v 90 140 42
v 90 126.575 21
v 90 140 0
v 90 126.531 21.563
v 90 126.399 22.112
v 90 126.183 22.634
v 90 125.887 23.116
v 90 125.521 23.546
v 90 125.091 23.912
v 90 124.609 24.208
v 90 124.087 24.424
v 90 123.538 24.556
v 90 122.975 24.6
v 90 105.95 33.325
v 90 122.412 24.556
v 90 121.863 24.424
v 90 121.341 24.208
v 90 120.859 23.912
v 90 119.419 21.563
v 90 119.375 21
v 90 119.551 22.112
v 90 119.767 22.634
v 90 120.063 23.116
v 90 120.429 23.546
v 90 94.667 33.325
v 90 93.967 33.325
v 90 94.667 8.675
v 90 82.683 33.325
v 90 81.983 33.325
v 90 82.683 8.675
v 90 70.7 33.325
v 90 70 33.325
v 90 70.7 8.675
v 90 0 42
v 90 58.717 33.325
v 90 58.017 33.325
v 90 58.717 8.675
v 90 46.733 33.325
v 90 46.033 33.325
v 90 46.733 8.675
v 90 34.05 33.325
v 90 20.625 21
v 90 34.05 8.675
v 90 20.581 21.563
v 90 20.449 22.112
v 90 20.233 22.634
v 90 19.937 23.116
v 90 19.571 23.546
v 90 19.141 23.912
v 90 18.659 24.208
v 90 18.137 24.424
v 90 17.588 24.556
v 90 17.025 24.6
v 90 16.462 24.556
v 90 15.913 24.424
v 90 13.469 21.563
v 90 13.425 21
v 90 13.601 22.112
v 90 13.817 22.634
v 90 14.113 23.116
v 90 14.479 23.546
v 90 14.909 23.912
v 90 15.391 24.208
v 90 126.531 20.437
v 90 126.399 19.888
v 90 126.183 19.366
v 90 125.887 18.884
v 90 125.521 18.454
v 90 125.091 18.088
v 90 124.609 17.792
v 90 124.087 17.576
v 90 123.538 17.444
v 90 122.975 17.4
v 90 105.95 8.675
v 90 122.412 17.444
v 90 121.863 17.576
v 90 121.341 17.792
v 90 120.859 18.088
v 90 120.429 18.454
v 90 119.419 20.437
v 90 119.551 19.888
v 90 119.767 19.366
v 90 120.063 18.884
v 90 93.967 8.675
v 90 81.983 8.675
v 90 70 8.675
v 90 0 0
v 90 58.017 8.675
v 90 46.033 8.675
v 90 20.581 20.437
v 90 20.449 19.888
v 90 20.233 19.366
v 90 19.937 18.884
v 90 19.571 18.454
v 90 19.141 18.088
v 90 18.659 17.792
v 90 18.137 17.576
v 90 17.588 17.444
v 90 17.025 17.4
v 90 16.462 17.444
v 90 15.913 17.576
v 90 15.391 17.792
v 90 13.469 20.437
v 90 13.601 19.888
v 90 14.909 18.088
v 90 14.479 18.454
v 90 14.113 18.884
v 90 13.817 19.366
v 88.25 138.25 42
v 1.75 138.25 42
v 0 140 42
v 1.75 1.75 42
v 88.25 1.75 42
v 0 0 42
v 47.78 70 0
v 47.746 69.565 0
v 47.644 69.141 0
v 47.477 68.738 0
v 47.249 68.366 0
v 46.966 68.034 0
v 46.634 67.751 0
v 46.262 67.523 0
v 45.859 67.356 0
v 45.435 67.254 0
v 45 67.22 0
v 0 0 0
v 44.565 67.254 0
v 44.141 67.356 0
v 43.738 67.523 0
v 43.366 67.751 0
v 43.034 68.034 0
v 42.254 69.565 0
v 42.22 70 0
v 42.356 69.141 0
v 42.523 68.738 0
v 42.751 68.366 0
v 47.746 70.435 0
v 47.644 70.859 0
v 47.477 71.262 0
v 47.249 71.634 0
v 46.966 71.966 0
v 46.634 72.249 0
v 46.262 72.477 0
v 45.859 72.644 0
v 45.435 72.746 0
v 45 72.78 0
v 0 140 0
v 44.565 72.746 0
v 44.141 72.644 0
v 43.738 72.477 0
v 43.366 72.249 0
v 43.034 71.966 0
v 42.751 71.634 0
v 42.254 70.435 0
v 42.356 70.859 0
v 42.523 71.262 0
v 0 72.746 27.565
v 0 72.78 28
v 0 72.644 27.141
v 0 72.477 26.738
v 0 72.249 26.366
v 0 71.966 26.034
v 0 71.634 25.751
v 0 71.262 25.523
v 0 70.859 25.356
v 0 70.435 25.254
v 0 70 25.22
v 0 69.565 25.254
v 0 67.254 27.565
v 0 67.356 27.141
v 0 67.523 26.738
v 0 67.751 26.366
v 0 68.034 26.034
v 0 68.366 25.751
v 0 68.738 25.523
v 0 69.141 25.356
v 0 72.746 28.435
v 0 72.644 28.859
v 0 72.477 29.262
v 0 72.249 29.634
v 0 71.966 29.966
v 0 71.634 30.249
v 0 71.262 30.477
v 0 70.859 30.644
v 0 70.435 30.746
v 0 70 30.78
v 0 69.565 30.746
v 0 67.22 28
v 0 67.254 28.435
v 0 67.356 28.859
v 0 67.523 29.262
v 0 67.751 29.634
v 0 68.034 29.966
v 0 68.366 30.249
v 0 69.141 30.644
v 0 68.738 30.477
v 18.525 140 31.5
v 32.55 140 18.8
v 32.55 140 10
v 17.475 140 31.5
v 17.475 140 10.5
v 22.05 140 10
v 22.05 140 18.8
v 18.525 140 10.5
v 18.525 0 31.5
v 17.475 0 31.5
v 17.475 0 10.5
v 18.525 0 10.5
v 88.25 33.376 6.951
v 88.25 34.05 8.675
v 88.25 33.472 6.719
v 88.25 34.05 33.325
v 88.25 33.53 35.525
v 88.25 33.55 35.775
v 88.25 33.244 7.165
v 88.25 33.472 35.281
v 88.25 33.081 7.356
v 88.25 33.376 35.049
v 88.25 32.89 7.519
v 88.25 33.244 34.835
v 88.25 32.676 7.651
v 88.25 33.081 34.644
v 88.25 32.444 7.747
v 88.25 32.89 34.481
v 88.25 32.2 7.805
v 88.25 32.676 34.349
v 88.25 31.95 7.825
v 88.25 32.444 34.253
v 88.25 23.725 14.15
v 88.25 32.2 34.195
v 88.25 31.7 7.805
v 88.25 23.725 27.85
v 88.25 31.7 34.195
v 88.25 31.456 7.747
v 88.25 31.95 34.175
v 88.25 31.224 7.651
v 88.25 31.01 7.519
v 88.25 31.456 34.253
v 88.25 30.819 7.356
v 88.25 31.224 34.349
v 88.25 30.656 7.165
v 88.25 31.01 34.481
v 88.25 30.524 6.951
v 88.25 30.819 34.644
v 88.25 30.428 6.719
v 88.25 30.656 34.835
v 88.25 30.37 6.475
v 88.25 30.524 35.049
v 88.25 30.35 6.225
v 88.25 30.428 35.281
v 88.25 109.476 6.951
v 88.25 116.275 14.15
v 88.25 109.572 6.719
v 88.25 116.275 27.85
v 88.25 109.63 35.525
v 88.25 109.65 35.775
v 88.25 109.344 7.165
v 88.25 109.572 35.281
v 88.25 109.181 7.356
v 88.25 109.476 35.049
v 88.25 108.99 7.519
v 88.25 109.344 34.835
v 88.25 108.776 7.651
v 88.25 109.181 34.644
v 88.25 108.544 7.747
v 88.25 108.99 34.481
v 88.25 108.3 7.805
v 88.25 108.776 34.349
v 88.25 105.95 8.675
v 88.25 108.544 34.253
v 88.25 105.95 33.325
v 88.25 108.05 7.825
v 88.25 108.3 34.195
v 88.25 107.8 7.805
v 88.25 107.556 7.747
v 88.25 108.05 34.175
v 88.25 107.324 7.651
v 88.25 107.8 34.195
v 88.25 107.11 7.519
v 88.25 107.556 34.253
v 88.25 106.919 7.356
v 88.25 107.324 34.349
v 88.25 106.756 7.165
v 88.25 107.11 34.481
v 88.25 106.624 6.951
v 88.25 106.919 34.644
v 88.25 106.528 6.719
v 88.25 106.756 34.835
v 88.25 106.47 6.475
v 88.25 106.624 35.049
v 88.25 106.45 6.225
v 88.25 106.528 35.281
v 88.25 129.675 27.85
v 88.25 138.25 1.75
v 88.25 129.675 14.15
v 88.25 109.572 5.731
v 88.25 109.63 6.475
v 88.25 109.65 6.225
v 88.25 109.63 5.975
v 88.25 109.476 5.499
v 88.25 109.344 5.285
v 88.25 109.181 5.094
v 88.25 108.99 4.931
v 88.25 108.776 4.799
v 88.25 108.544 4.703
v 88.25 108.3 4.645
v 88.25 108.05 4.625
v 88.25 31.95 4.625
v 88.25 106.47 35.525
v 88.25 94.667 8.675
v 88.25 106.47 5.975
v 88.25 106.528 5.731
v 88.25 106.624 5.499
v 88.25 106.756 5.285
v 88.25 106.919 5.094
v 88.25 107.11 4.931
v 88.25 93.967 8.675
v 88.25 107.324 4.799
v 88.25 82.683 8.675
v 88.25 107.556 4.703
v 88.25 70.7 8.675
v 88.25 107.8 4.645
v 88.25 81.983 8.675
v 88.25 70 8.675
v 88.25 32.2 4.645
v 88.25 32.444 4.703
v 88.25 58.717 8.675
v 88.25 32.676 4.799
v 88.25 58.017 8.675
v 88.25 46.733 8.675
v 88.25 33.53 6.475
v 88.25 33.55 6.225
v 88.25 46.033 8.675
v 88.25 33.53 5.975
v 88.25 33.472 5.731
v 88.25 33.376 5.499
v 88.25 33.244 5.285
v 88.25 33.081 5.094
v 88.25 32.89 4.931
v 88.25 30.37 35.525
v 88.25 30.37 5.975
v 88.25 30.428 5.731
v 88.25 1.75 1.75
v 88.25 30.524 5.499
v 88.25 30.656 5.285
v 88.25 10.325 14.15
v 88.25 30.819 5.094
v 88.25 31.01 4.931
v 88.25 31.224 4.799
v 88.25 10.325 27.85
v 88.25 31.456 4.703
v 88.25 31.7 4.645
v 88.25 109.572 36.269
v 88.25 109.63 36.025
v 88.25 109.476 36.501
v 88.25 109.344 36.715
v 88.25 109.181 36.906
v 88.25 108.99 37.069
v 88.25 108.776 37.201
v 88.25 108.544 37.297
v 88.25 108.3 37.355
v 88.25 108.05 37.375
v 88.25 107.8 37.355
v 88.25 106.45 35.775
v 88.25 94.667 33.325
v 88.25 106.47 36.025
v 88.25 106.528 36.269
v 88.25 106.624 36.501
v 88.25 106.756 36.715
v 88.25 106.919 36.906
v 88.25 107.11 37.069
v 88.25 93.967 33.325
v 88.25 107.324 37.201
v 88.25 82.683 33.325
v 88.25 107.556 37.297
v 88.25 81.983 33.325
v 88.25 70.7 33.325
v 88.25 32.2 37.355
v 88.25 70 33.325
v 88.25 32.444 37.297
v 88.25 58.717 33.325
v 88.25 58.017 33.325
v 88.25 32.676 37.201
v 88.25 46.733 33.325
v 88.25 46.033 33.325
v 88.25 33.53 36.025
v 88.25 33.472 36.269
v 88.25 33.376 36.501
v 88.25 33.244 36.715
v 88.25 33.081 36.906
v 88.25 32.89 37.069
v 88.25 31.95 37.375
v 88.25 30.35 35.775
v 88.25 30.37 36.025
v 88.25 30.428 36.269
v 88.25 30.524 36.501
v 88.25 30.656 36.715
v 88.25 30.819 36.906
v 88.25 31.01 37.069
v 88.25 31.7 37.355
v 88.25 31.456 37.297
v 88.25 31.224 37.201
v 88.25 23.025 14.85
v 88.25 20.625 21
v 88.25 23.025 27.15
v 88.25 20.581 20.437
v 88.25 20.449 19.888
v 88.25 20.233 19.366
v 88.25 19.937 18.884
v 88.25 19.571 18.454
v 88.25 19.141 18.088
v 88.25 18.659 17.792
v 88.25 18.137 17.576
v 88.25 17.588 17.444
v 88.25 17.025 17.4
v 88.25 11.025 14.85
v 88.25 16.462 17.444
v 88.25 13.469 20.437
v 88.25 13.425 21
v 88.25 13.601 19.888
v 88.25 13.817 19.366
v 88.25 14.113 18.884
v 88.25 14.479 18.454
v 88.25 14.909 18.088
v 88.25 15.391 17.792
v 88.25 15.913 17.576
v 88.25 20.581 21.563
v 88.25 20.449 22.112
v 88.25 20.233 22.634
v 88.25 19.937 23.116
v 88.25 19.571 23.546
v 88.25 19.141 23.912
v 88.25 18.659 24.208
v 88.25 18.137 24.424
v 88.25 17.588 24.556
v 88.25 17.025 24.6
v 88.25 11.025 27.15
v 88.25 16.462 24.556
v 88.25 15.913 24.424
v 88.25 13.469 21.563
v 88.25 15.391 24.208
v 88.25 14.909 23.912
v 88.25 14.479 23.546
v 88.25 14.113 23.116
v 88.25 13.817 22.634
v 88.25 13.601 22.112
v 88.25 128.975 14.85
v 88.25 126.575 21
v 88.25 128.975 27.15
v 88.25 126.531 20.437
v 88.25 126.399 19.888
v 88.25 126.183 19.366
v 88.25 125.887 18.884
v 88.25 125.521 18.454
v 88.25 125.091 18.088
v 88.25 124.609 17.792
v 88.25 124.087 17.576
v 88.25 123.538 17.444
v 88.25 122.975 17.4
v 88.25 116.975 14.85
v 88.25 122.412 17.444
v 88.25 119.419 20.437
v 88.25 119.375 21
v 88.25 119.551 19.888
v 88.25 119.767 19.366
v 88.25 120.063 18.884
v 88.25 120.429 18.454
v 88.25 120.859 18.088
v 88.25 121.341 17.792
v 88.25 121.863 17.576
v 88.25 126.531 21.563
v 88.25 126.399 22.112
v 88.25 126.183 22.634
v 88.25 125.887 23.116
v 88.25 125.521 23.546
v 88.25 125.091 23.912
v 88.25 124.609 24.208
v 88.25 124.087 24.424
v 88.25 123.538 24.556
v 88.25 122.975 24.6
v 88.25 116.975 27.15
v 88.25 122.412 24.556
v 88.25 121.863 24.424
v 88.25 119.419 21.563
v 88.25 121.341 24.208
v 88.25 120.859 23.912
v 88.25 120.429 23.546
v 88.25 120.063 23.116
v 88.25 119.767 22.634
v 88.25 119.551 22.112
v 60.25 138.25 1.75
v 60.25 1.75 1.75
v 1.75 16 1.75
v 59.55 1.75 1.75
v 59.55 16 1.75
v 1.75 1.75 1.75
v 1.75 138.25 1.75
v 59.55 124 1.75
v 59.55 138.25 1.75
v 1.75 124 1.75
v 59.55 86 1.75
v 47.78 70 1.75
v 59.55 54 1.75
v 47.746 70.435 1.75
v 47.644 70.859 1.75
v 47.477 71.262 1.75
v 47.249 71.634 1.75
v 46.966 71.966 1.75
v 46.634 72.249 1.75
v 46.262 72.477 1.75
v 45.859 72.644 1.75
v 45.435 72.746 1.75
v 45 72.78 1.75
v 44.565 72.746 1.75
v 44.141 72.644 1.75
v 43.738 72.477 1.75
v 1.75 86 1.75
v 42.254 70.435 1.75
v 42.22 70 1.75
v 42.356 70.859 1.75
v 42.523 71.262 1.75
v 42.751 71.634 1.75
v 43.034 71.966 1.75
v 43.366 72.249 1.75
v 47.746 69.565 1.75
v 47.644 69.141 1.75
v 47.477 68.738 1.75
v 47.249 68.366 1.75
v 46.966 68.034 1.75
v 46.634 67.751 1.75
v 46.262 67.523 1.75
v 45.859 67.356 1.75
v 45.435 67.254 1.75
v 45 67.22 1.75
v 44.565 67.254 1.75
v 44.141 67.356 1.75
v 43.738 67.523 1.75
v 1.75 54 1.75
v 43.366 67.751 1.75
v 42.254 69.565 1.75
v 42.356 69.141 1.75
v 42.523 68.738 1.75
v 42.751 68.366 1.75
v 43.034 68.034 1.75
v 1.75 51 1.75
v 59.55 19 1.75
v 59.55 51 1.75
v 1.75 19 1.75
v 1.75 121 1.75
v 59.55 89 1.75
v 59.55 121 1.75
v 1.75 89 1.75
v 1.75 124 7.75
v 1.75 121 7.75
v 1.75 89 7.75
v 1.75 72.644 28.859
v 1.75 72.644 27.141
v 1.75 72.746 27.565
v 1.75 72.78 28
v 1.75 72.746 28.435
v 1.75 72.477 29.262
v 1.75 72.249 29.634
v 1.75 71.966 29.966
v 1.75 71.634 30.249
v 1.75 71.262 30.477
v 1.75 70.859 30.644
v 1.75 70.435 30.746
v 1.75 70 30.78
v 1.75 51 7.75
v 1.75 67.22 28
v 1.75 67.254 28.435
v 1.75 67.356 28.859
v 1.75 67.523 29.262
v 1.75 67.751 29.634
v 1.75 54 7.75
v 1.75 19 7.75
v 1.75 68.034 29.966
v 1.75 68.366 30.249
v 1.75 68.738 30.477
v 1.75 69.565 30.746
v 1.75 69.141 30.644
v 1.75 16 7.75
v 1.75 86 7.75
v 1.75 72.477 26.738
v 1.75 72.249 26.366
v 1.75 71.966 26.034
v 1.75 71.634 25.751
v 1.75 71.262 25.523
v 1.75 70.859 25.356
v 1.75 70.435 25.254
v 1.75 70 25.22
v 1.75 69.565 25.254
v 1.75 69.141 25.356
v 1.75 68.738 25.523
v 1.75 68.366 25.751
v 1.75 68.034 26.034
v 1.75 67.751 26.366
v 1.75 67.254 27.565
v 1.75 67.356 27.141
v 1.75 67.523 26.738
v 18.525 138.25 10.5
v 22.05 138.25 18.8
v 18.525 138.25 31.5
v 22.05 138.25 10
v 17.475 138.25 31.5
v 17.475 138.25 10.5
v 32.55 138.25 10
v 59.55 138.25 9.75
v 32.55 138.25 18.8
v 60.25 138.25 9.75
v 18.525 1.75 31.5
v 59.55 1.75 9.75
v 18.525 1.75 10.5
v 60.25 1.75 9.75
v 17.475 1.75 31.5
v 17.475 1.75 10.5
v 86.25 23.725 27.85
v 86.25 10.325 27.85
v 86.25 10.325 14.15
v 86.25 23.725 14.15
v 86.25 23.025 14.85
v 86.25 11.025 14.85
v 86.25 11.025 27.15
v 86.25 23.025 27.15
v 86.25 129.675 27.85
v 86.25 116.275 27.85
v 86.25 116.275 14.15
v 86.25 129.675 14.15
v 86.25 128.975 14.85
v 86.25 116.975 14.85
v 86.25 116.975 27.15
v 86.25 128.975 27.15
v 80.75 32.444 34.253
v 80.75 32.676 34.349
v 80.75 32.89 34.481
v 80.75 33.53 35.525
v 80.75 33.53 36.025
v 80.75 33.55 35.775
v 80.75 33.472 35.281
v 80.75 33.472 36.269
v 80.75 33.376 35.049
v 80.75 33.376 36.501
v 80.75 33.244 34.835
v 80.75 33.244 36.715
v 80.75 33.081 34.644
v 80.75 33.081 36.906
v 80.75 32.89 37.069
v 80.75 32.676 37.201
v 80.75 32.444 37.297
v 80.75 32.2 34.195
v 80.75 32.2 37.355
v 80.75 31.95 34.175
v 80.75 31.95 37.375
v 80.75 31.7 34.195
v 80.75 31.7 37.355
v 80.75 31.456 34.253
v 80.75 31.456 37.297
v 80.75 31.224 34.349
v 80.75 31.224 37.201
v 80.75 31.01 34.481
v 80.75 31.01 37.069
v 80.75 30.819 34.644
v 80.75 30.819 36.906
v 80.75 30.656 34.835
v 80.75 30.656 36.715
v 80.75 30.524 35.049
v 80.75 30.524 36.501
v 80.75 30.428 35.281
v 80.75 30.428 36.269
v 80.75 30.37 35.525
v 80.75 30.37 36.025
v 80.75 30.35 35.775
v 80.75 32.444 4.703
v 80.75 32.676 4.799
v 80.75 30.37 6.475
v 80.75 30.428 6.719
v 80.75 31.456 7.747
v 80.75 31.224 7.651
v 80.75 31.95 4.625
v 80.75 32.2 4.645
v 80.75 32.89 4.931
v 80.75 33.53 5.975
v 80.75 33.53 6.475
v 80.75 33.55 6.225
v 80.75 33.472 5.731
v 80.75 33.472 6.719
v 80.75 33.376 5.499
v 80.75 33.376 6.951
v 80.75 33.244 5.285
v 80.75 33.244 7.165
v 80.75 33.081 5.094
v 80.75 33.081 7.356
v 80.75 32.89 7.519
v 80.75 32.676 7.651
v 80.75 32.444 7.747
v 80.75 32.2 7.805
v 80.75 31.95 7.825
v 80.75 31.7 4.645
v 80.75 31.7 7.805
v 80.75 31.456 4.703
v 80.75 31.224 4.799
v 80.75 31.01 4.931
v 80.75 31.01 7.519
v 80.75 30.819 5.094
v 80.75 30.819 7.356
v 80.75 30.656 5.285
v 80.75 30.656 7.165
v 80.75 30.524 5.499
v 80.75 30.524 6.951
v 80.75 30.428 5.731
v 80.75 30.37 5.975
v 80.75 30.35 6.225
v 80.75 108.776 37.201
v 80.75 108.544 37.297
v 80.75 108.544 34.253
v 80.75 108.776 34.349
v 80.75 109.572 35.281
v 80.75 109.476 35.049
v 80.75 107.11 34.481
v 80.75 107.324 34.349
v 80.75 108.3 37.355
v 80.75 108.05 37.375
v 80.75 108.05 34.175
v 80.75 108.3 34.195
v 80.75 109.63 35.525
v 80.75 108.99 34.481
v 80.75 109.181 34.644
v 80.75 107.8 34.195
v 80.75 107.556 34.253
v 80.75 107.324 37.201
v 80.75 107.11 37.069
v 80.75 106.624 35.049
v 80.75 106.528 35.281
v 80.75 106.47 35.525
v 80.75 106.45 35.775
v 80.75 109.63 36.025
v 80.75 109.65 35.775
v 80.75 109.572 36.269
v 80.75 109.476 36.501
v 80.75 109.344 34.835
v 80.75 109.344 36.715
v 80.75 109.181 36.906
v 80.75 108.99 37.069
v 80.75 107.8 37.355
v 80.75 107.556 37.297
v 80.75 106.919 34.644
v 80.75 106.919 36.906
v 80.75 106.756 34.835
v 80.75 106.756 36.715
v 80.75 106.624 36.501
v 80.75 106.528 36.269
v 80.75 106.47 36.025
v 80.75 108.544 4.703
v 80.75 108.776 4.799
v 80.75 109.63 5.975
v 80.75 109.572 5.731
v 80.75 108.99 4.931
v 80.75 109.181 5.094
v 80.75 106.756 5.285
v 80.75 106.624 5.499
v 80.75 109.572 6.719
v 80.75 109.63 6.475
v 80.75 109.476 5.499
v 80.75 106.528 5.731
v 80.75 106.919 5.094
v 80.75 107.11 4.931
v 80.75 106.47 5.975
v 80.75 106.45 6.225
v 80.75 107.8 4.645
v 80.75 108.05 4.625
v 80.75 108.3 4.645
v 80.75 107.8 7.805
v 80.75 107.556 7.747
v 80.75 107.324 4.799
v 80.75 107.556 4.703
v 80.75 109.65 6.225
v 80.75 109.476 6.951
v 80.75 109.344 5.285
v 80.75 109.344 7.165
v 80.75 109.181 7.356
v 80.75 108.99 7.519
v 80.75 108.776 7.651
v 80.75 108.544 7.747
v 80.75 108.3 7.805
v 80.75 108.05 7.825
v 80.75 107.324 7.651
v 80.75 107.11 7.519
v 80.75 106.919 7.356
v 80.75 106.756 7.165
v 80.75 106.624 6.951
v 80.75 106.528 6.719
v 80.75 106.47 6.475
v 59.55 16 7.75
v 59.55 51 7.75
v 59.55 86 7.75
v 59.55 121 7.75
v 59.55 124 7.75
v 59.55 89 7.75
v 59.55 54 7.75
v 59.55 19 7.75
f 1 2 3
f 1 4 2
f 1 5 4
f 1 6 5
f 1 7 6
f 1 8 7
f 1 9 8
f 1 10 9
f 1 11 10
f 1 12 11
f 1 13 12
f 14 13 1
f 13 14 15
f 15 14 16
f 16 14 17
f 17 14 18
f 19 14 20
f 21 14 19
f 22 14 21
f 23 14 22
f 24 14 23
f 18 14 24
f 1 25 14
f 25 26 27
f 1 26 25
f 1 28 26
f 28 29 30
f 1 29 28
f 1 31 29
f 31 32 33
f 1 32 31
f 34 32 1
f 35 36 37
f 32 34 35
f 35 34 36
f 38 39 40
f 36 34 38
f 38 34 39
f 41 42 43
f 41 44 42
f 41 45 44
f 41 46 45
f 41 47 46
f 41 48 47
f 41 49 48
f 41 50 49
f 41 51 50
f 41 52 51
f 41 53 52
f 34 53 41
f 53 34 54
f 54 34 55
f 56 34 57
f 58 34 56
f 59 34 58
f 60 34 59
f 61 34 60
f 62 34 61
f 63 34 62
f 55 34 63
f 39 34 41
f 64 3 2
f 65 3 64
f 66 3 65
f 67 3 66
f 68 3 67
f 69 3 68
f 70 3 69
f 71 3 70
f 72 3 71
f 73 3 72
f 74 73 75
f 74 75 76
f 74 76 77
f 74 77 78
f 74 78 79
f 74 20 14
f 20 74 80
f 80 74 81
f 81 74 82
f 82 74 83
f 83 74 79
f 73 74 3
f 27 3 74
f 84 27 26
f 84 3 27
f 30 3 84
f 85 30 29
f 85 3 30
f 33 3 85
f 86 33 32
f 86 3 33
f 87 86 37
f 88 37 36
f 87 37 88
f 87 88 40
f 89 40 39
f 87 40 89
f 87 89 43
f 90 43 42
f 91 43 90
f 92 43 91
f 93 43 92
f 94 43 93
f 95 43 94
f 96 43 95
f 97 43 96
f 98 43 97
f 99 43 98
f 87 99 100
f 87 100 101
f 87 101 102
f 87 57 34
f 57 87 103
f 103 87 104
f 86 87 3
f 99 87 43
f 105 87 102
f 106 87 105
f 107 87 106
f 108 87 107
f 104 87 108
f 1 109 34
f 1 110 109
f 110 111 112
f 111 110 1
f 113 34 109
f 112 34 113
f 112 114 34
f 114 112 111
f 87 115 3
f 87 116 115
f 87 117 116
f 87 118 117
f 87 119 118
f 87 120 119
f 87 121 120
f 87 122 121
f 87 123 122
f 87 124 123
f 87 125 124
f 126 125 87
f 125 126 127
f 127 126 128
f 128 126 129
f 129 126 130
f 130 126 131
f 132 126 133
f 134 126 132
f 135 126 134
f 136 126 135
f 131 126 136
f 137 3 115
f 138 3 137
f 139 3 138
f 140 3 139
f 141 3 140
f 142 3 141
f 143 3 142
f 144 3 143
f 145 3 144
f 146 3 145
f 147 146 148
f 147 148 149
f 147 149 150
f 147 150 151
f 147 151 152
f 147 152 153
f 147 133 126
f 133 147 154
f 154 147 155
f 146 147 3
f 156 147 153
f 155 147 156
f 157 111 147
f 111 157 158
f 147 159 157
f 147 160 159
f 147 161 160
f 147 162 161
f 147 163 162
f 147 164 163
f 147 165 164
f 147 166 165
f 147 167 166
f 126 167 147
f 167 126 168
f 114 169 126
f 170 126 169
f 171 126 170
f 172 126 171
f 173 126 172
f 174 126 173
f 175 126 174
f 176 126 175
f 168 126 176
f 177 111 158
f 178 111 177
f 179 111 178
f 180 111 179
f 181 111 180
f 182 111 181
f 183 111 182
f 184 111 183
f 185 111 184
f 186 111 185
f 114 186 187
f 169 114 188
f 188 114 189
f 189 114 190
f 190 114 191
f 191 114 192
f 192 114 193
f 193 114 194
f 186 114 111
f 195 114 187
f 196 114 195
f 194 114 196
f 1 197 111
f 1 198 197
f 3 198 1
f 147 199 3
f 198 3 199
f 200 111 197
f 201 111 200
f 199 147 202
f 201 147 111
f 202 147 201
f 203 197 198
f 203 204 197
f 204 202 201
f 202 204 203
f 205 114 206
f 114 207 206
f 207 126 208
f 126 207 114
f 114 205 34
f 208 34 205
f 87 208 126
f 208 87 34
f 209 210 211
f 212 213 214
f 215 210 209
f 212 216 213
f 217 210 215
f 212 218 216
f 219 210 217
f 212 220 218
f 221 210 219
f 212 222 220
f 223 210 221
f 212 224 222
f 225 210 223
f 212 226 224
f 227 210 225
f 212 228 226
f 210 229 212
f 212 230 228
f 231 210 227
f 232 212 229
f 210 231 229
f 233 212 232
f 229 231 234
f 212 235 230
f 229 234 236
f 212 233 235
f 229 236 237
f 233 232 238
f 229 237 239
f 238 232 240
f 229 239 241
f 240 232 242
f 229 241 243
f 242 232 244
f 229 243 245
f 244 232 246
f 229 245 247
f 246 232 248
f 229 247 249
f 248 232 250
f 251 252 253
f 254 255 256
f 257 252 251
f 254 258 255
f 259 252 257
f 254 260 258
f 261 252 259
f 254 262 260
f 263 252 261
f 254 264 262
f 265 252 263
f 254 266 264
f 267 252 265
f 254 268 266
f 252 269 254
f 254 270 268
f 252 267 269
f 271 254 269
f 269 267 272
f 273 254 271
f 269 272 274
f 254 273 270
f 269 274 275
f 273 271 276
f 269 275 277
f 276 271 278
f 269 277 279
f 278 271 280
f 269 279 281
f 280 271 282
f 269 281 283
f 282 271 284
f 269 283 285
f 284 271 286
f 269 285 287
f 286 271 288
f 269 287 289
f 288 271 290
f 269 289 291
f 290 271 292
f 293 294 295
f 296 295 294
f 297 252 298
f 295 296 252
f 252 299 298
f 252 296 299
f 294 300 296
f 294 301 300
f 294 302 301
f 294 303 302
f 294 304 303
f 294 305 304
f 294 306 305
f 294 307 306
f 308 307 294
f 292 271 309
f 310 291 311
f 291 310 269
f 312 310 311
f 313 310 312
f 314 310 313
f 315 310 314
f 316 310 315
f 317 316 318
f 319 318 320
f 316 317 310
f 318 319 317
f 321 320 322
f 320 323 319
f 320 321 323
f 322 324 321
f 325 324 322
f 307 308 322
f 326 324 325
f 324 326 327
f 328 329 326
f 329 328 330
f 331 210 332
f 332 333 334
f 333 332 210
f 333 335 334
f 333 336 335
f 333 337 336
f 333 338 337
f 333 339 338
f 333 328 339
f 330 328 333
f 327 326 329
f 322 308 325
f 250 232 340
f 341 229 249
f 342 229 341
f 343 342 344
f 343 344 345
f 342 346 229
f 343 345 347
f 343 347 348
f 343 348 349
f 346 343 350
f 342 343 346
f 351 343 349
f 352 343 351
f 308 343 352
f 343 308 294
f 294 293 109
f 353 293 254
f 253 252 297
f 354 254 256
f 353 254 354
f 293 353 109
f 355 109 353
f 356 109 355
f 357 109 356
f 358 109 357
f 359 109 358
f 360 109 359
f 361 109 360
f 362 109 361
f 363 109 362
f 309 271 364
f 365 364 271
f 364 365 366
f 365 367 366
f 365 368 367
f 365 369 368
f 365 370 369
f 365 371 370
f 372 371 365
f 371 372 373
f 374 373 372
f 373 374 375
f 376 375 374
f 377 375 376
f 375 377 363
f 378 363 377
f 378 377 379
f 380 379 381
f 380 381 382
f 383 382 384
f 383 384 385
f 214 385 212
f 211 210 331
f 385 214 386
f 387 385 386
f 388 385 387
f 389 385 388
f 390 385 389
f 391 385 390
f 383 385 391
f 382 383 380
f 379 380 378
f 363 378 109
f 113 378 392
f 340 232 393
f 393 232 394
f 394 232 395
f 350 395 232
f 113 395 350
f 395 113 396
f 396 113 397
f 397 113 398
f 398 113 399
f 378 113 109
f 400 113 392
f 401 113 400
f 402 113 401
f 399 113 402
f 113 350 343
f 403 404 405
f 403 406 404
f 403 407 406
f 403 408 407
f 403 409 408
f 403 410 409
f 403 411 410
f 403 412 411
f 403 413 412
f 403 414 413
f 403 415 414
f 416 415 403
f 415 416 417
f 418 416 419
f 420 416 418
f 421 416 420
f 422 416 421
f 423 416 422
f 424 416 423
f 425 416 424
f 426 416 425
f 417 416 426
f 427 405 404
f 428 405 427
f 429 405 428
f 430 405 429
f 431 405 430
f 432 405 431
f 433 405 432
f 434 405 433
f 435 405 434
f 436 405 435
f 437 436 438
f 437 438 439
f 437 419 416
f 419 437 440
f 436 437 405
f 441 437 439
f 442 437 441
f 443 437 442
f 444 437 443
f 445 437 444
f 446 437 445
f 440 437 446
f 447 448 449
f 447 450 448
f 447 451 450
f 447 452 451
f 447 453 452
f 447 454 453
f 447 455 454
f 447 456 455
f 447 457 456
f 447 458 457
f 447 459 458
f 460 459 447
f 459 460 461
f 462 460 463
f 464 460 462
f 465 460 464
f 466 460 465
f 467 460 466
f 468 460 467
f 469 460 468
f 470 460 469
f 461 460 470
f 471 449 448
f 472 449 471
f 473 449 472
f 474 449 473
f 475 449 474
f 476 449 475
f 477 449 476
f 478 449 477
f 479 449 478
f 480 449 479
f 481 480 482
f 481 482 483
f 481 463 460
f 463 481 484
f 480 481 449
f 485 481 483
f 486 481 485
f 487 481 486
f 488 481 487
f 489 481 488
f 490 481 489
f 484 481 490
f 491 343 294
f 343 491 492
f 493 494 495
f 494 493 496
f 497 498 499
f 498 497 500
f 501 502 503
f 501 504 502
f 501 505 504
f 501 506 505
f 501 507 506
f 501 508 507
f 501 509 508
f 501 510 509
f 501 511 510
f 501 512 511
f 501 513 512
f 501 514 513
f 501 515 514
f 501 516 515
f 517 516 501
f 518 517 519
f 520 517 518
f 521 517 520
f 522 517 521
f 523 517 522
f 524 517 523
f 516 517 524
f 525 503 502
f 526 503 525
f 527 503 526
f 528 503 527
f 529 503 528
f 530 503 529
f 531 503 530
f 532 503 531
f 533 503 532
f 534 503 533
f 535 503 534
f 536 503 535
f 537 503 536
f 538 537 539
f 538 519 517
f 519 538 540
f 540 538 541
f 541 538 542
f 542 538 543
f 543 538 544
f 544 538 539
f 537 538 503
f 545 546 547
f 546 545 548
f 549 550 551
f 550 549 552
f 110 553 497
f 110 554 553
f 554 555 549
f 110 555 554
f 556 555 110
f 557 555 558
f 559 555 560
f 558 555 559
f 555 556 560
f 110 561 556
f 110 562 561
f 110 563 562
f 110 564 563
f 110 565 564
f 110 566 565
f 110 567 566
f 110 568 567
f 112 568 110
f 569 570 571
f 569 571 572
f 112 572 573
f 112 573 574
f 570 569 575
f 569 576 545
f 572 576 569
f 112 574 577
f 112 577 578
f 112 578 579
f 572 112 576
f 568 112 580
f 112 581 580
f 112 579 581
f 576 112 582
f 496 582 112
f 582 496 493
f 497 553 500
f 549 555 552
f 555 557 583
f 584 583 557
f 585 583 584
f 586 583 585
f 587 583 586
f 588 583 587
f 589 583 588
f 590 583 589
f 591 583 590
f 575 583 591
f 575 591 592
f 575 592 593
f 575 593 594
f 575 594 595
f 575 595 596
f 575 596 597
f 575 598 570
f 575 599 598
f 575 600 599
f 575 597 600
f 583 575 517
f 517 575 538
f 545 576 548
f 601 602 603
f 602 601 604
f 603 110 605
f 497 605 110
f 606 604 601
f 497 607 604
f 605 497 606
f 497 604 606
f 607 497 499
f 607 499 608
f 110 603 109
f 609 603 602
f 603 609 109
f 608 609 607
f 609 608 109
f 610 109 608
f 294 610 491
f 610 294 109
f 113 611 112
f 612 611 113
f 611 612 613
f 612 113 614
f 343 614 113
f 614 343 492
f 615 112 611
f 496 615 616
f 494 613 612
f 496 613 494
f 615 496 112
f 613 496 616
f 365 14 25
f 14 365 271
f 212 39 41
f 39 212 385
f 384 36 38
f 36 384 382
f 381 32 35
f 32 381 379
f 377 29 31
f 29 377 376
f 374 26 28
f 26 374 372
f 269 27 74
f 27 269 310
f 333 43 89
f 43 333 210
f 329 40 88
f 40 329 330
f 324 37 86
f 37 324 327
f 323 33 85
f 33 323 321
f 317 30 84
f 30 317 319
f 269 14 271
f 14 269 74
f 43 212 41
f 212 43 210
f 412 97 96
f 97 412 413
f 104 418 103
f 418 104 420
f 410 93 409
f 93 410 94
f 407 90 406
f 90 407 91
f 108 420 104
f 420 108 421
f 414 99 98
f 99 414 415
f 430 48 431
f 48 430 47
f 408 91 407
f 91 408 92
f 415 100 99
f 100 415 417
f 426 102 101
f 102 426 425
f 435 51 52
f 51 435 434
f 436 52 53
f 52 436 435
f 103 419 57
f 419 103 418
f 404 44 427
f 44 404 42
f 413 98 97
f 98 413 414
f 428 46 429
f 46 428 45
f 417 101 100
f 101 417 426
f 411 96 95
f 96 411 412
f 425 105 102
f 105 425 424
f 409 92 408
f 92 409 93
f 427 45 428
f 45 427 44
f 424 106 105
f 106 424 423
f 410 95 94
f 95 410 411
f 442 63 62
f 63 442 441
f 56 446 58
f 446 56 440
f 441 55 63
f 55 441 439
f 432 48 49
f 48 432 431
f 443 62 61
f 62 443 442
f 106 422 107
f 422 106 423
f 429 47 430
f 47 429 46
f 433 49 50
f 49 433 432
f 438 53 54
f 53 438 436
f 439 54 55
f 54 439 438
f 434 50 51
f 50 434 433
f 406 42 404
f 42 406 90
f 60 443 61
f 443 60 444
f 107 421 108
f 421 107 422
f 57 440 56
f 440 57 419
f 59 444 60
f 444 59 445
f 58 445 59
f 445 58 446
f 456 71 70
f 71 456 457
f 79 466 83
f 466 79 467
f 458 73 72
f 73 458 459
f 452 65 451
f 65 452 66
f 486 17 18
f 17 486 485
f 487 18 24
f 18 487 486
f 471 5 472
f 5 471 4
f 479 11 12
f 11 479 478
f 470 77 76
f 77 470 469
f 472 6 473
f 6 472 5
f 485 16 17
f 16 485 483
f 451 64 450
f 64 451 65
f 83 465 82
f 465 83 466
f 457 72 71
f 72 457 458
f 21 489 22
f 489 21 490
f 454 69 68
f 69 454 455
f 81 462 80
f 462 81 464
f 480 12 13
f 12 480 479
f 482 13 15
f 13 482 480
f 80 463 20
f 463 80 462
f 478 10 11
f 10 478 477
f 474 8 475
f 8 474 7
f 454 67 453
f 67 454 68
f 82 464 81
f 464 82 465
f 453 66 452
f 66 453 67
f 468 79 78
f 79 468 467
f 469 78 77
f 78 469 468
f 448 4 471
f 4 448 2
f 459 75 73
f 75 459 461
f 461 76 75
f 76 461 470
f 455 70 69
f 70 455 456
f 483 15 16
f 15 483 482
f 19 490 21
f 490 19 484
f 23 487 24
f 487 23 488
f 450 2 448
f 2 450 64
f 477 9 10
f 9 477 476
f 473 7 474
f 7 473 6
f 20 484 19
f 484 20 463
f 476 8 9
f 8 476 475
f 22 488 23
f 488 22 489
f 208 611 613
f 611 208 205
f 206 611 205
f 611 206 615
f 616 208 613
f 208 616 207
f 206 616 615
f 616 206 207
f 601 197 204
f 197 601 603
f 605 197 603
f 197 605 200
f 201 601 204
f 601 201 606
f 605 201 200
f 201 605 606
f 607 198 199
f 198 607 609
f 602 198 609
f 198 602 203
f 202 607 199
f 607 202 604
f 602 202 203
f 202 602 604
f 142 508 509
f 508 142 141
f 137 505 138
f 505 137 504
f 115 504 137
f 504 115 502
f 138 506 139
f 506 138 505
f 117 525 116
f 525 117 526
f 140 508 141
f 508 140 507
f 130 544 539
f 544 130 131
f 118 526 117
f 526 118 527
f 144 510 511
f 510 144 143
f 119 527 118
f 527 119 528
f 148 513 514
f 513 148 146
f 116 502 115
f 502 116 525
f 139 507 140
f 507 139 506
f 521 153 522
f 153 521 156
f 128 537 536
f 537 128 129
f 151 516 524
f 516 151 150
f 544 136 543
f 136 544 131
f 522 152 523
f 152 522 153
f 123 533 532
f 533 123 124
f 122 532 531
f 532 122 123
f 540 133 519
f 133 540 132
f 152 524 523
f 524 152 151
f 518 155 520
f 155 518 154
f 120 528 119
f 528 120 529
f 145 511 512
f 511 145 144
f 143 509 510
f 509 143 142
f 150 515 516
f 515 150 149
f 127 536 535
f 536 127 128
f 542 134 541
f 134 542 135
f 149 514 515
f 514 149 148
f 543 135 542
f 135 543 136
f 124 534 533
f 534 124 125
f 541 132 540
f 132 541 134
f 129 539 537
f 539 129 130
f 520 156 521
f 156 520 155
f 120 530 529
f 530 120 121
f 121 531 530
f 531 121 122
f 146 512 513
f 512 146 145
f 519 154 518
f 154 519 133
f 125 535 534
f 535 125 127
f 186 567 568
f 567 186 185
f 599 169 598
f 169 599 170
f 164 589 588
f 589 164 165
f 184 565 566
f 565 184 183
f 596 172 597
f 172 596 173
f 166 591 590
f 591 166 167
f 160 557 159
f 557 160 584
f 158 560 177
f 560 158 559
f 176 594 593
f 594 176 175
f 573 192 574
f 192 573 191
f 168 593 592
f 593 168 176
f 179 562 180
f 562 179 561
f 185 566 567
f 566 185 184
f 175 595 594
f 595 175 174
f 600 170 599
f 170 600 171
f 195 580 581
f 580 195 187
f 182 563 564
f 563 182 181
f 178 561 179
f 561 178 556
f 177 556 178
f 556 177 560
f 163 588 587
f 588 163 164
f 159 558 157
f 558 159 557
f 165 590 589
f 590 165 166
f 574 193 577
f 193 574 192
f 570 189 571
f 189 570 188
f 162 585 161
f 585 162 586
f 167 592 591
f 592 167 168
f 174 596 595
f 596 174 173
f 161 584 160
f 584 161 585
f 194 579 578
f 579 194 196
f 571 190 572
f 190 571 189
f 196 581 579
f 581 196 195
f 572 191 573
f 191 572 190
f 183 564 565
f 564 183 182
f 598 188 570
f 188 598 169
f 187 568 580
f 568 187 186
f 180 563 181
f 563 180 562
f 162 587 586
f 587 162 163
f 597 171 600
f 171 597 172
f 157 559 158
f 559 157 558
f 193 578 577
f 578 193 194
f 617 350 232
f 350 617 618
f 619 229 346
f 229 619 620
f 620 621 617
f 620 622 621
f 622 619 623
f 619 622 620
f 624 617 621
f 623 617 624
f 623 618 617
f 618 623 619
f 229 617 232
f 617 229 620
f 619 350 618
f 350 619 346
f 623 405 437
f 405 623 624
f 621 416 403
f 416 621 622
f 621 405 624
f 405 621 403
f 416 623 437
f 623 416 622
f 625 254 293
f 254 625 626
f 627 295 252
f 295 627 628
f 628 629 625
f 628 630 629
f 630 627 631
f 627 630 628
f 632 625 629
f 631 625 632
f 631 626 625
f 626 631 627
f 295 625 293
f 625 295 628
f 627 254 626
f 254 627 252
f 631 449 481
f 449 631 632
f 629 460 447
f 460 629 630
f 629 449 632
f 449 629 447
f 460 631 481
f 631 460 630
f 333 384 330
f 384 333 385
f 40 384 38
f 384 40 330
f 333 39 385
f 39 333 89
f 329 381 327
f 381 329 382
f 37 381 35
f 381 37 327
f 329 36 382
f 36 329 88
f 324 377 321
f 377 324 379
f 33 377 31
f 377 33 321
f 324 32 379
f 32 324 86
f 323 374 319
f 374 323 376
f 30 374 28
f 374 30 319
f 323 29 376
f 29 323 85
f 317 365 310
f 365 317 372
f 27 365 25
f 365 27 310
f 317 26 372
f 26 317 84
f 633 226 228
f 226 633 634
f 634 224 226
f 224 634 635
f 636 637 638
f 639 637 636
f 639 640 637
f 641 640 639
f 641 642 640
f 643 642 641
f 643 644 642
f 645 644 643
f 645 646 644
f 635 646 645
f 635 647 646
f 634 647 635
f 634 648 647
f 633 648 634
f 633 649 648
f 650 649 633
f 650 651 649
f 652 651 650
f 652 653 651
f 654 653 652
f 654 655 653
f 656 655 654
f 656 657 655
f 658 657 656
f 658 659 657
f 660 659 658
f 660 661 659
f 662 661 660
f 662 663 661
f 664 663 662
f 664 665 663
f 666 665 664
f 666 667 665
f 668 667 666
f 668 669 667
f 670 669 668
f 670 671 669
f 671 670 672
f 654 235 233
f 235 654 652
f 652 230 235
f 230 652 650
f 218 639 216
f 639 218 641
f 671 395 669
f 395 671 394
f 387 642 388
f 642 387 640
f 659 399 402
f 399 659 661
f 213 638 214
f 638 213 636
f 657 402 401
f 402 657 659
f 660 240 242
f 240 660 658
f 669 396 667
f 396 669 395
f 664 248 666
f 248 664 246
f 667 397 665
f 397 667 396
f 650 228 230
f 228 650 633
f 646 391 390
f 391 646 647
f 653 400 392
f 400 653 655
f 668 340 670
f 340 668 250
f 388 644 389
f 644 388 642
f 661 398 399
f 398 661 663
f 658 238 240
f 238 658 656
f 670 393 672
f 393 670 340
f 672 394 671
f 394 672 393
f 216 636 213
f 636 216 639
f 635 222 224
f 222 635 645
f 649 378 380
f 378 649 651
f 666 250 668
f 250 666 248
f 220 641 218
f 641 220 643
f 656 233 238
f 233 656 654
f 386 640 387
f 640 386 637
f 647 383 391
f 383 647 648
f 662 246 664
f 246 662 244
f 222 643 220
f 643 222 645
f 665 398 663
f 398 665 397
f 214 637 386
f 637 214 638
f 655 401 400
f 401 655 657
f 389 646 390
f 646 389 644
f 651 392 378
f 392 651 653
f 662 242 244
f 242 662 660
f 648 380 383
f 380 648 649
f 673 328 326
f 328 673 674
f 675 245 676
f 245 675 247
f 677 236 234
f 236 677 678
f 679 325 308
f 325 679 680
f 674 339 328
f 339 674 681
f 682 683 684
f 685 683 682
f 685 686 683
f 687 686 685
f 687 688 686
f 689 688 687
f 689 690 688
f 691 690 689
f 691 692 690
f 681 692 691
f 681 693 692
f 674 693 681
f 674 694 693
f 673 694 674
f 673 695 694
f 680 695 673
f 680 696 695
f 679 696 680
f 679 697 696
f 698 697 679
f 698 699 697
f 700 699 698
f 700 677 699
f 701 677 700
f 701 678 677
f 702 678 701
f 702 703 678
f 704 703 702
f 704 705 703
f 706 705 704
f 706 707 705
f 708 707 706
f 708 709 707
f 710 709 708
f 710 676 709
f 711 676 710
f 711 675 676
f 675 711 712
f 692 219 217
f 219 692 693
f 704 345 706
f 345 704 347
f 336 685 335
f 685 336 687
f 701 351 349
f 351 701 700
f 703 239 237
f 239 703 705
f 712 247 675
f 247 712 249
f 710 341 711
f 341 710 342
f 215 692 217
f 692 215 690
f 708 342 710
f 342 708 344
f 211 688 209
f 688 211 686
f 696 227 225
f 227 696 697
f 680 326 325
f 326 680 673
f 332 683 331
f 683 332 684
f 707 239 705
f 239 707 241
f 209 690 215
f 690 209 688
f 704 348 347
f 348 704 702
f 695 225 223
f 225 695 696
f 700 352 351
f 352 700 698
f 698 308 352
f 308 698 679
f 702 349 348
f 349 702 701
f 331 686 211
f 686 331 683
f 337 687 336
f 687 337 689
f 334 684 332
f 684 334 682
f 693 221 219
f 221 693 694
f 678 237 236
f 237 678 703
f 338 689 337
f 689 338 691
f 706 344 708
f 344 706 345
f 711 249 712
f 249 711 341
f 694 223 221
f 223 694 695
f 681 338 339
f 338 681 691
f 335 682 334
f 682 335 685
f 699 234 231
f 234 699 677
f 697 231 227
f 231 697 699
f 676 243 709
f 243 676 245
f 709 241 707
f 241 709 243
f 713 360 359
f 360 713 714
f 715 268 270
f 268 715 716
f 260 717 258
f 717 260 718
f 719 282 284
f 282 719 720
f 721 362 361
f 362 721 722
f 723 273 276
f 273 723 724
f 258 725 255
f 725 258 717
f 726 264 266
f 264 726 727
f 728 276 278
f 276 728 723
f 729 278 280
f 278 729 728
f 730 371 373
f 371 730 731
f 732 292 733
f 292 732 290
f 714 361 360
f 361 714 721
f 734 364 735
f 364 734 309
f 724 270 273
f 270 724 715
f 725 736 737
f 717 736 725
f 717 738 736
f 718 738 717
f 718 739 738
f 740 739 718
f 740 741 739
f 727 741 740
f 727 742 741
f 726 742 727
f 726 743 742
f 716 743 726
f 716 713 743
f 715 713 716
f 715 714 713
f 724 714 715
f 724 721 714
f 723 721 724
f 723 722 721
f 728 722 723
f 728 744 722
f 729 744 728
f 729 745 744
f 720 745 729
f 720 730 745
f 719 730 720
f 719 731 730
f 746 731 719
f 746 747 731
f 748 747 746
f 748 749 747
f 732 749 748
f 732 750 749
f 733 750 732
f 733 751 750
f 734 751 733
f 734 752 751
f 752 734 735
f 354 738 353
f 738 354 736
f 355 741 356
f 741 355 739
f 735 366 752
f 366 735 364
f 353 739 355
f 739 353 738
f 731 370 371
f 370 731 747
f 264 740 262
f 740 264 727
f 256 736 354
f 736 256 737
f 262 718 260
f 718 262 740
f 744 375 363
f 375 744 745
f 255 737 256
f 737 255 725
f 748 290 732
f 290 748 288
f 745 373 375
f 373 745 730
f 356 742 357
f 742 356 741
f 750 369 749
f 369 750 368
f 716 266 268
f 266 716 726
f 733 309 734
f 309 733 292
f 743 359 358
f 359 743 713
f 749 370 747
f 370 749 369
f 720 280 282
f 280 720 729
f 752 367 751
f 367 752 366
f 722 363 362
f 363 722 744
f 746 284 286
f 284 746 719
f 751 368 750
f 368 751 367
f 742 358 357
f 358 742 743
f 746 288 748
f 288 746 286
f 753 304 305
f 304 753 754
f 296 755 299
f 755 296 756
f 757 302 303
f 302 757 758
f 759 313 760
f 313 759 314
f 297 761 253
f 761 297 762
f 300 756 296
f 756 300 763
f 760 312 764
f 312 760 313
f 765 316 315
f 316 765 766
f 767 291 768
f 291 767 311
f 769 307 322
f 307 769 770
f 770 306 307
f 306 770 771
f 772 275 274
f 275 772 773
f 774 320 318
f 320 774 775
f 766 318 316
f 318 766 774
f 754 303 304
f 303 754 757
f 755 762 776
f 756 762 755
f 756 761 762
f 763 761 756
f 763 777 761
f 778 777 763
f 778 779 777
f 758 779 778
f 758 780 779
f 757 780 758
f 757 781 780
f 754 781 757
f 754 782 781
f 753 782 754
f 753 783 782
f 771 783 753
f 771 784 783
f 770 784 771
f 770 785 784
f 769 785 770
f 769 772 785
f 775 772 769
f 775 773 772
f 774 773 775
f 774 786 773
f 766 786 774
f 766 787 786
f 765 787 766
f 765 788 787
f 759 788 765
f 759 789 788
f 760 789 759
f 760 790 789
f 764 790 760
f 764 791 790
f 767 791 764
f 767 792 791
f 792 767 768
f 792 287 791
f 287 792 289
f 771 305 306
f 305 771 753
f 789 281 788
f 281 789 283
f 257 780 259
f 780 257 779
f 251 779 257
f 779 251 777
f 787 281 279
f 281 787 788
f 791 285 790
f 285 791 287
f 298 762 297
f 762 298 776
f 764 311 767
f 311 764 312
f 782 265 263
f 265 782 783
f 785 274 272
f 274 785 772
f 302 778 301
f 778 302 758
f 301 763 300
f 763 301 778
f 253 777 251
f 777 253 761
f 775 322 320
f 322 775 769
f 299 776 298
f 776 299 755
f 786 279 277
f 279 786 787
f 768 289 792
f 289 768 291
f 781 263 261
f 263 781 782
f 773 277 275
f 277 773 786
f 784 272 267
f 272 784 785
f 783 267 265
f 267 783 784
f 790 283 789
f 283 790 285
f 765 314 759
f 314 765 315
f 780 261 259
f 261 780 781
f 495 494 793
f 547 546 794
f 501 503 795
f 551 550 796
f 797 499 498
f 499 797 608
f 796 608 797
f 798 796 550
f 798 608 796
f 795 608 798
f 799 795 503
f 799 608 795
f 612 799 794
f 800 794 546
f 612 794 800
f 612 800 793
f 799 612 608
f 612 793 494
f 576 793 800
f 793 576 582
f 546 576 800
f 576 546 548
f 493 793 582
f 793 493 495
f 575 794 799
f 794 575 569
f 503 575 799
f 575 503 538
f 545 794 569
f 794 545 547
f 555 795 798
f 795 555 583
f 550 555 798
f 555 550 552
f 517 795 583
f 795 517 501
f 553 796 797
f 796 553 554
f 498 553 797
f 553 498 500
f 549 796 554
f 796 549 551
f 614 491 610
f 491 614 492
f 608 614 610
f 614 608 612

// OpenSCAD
//everything is in units of millimeters
resolution = 0.35;

mainDepth = 90;
mainWidth = 140;
mainHeight = 42;
mainShellThickness = 5 * resolution;

displayWidth = 71.9;
displayDepth = mainShellThickness;
displayHeight = 24.65;
displaySupportColumnWidth = resolution * 2;
displayScrewHoleYoffset = 2.1;
displayScrewBottomHoleZoffset = 2.45;
displayScrewHoleCylinderDepth = 7.5;
knobHoleYoffset = (mainWidth - displayWidth) / 4;
knobHoleZoffset = (mainHeight / 2);
knobHoleRadius = 3.6;
knobHoleDepth = mainShellThickness;
knobScrewHoleYoffset = 9;
knobScrewBottomHoleZoffset = 6;
knobScrewTopHoleZoffset = 11;
knobScrewHoleRadius = 1.6;
knobSupportWallThickness = resolution * 2;
knobSupportWidth = 12 + 2 * knobSupportWallThickness;
knobSupportHeight = 12.3 + 2 * knobSupportWallThickness;
knobSupportDepth = 2;
airSlotDepth = resolution * 3;
airSlotWidth = mainShellThickness;
airSlotHeight = mainHeight * 0.5;
usbSlotDepth = 10.5;
usbSlotWidth = mainShellThickness;
usbSlotHeight = 8.8;
mountingHoleRadius = 2.78;
cylinderFragments = 40;
breadboardDepth = 57.8;
breadboardPlatformHeight = 6;
breadboardPlatformBeamWidth = 3;
breadboardFenceHeight = breadboardPlatformHeight + 3;
breadboardFenceThickness = resolution * 2;

union() {
  difference() {
    //main shell
    cube([mainDepth, mainWidth, mainHeight]);
    translate([mainShellThickness, mainShellThickness, mainShellThickness]) {//cut-out inside
      cube([mainDepth - mainShellThickness * 2, mainWidth - mainShellThickness * 2, mainHeight]);
    };
    
    //display
    translate([mainDepth - displayDepth, mainWidth/2 - displayWidth/2, mainHeight/2 - displayHeight/2]) {
      cube([displayDepth,displayWidth,displayHeight]);
    };
    
    //display top-left hole
    /*translate([mainDepth - displayDepth, mainWidth/2 - displayWidth/2 - displayScrewHoleYoffset, mainHeight/2 + displayHeight/2 + displayScrewBottomHoleZoffset]) {
      rotate([0,90,0]) {
        cylinder(knobHoleDepth,knobScrewHoleRadius,knobScrewHoleRadius,$fn=cylinderFragments);
      };
    };*/
    
    //display bottom-left hole
    /*translate([mainDepth - displayDepth, mainWidth/2 - displayWidth/2 - displayScrewHoleYoffset, mainHeight/2 - displayHeight/2 - displayScrewBottomHoleZoffset]) {
      rotate([0,90,0]) {
        cylinder(knobHoleDepth,knobScrewHoleRadius,knobScrewHoleRadius,$fn=cylinderFragments);
      };
    };*/
    
    //display top-right hole
    /*translate([mainDepth - displayDepth, mainWidth/2 + displayWidth/2 + displayScrewHoleYoffset, mainHeight/2 + displayHeight/2 + displayScrewBottomHoleZoffset]) {
      rotate([0,90,0]) {
        cylinder(knobHoleDepth,knobScrewHoleRadius,knobScrewHoleRadius,$fn=cylinderFragments);
      };
    };*/
    
    //display bottom-right hole
    /*translate([mainDepth - displayDepth, mainWidth/2 + displayWidth/2 + displayScrewHoleYoffset, mainHeight/2 - displayHeight/2 - displayScrewBottomHoleZoffset]) {
      rotate([0,90,0]) {
        cylinder(knobHoleDepth,knobScrewHoleRadius,knobScrewHoleRadius,$fn=cylinderFragments);
      };
    };*/
    
    //left knob
    translate([mainDepth - knobHoleDepth, knobHoleYoffset, knobHoleZoffset]) {
      rotate([0,90,0]) {
        cylinder(knobHoleDepth,knobHoleRadius,knobHoleRadius,$fn=cylinderFragments);
      };
    };
    
    //left knob bottom screw hole
    /*translate([mainDepth - knobHoleDepth, knobHoleYoffset + knobScrewHoleYoffset, knobHoleZoffset - knobScrewBottomHoleZoffset]) {
      rotate([0,90,0]) {
        cylinder(knobHoleDepth,knobScrewHoleRadius,knobScrewHoleRadius,$fn=cylinderFragments);
      };
    };*/
    
    //left knob top screw hole
    /*translate([mainDepth - knobHoleDepth, knobHoleYoffset + knobScrewHoleYoffset, knobHoleZoffset + knobScrewTopHoleZoffset]) {
      rotate([0,90,0]) {
        cylinder(knobHoleDepth,knobScrewHoleRadius,knobScrewHoleRadius,$fn=cylinderFragments);
      };
    };*/
    
    //right knob
    translate([mainDepth - knobHoleDepth, mainWidth - knobHoleYoffset, knobHoleZoffset]) {
      rotate([0,90,0]) {
        cylinder(knobHoleDepth,knobHoleRadius,knobHoleRadius,$fn=cylinderFragments);
      };
    };
    
    //right knob bottom screw hole
    /*translate([mainDepth - knobHoleDepth, mainWidth - knobHoleYoffset + knobScrewHoleYoffset, knobHoleZoffset - knobScrewBottomHoleZoffset]) {
      rotate([0,90,0]) {
        cylinder(knobHoleDepth,knobScrewHoleRadius,knobScrewHoleRadius,$fn=cylinderFragments);
      };
    };*/
    
    //right knob top screw hole
    /*translate([mainDepth - knobHoleDepth, mainWidth - knobHoleYoffset + knobScrewHoleYoffset, knobHoleZoffset + knobScrewTopHoleZoffset]) {
      rotate([0,90,0]) {
        cylinder(knobHoleDepth,knobScrewHoleRadius,knobScrewHoleRadius,$fn=cylinderFragments);
      };
    };*/
    
    //air slot left
    translate([mainDepth/5 - airSlotDepth/2, 0, mainHeight/2 - airSlotHeight/2]) {
      cube([airSlotDepth, airSlotWidth, airSlotHeight]);
    };
    
    //air slot right
    translate([mainDepth/5 - airSlotDepth/2, mainWidth - airSlotWidth, mainHeight/2 - airSlotHeight/2]) {
      cube([airSlotDepth, airSlotWidth, airSlotHeight]);
    };
    
    //usb cable slot right side
    translate([breadboardDepth/2 - usbSlotDepth/2 - 1.6, mainWidth - usbSlotWidth, breadboardPlatformHeight + 4]) {
      cube([usbSlotDepth, usbSlotWidth, usbSlotHeight]);
    };
    
    //bottom mounting hole
    translate([mainDepth/2, mainWidth/2, 0]) {
      cylinder(mainShellThickness, mountingHoleRadius, mountingHoleRadius,$fn=cylinderFragments);
    };
    
    //back mounting hole
    translate([0, mainWidth/2, mainHeight/3 * 2]) {
      rotate([0,90,0]) {
        cylinder(mainShellThickness, mountingHoleRadius, mountingHoleRadius,$fn=cylinderFragments);
      };
    };
  };
  
  //Display support column #1
  translate([mainDepth - displayDepth, mainWidth/2 - displayWidth/2 + displayWidth/6, mainHeight/2 - displayHeight/2]) {
      cube([displayDepth,displaySupportColumnWidth,displayHeight]);
  };
  
  //Display support column #2
  translate([mainDepth - displayDepth, mainWidth/2 - displayWidth/2 + displayWidth/6 * 2, mainHeight/2 - displayHeight/2]) {
      cube([displayDepth,displaySupportColumnWidth,displayHeight]);
  };
  
  //Display support column #3 (middle column)
  translate([mainDepth - displayDepth, mainWidth/2, mainHeight/2 - displayHeight/2]) {
      cube([displayDepth,displaySupportColumnWidth,displayHeight]);
  };
  
  //Display support column #4
  translate([mainDepth - displayDepth, mainWidth/2 + displayWidth/6, mainHeight/2 - displayHeight/2]) {
      cube([displayDepth,displaySupportColumnWidth,displayHeight]);
  };
  
  //Display support column #5
  translate([mainDepth - displayDepth, mainWidth/2 + displayWidth/6 * 2, mainHeight/2 - displayHeight/2]) {
      cube([displayDepth,displaySupportColumnWidth,displayHeight]);
  };
  
  //Left Knob Support Structure
  difference() {
    //cube of support structure
    translate([mainDepth - mainShellThickness - knobSupportDepth, knobHoleYoffset - knobSupportWidth / 2, knobHoleZoffset - knobSupportHeight / 2]) {
      cube([knobSupportDepth, knobSupportWidth, knobSupportHeight]);
    }
    
    //hollowing out the center
    translate([mainDepth - mainShellThickness - knobSupportDepth, knobHoleYoffset - knobSupportWidth / 2 + knobSupportWallThickness, knobHoleZoffset - knobSupportHeight / 2 + knobSupportWallThickness]) {
      cube([knobSupportDepth, knobSupportWidth - knobSupportWallThickness * 2, knobSupportHeight - knobSupportWallThickness * 2]);
    }
  }
  
  //Right Knob Support Structure
  difference() {
    //cube of support structure
    translate([mainDepth - mainShellThickness - knobSupportDepth, mainWidth - knobHoleYoffset - knobSupportWidth / 2, knobHoleZoffset - knobSupportHeight / 2]) {
      cube([knobSupportDepth, knobSupportWidth, knobSupportHeight]);
    }
    
    //hollowing out the center
    translate([mainDepth - mainShellThickness - knobSupportDepth, mainWidth - knobHoleYoffset - knobSupportWidth / 2 + knobSupportWallThickness, knobHoleZoffset - knobSupportHeight / 2 + knobSupportWallThickness]) {
      cube([knobSupportDepth, knobSupportWidth - knobSupportWallThickness * 2, knobSupportHeight - knobSupportWallThickness * 2]);
    }
  }
  
  //display top-left hole support
  translate([mainDepth - mainShellThickness - displayScrewHoleCylinderDepth, mainWidth/2 - displayWidth/2 - displayScrewHoleYoffset, mainHeight/2 + displayHeight/2 + displayScrewBottomHoleZoffset]) {
    rotate([0,90,0]) {
      cylinder(displayScrewHoleCylinderDepth,knobScrewHoleRadius,knobScrewHoleRadius,$fn=cylinderFragments);
    };
  };
  
  //display bottom-left hole support
  translate([mainDepth - mainShellThickness - displayScrewHoleCylinderDepth, mainWidth/2 - displayWidth/2 - displayScrewHoleYoffset, mainHeight/2 - displayHeight/2 - displayScrewBottomHoleZoffset]) {
    rotate([0,90,0]) {
      cylinder(displayScrewHoleCylinderDepth,knobScrewHoleRadius,knobScrewHoleRadius,$fn=cylinderFragments);
    };
  };
  
  //display top-right hole support
  translate([mainDepth - mainShellThickness - displayScrewHoleCylinderDepth, mainWidth/2 + displayWidth/2 + displayScrewHoleYoffset, mainHeight/2 + displayHeight/2 + displayScrewBottomHoleZoffset]) {
    rotate([0,90,0]) {
      cylinder(displayScrewHoleCylinderDepth,knobScrewHoleRadius,knobScrewHoleRadius,$fn=cylinderFragments);
    };
  };
  
  //display bottom-right hole support
  translate([mainDepth - mainShellThickness - displayScrewHoleCylinderDepth, mainWidth/2 + displayWidth/2 + displayScrewHoleYoffset, mainHeight/2 - displayHeight/2 - displayScrewBottomHoleZoffset]) {
    rotate([0,90,0]) {
      cylinder(displayScrewHoleCylinderDepth,knobScrewHoleRadius,knobScrewHoleRadius,$fn=cylinderFragments);
    };
  };
  

  //breadboard platform #1 (furthest left)
  translate([mainShellThickness, mainWidth/8 - breadboardPlatformBeamWidth/2, mainShellThickness]) {
    cube([breadboardDepth, breadboardPlatformBeamWidth, breadboardPlatformHeight]);
  };
  
  //breadboard platform #2
  translate([mainShellThickness, mainWidth/8 * 3 - breadboardPlatformBeamWidth/2, mainShellThickness]) {
    cube([breadboardDepth, breadboardPlatformBeamWidth, breadboardPlatformHeight]);
  };
  
  //breadboard platform #3
  translate([mainShellThickness, mainWidth/8 * 5 - breadboardPlatformBeamWidth/2, mainShellThickness]) {
    cube([breadboardDepth, breadboardPlatformBeamWidth, breadboardPlatformHeight]);
  };
  
  //breadboard platform #4
  translate([mainShellThickness, mainWidth/8 * 7 - breadboardPlatformBeamWidth/2, mainShellThickness]) {
    cube([breadboardDepth, breadboardPlatformBeamWidth, breadboardPlatformHeight]);
  };
  
  breadboardFenceHeight = breadboardPlatformHeight + 2;
breadboardFenceThickness = resolution * 2;
  //breadboard fence
  translate([mainShellThickness + breadboardDepth, mainShellThickness, mainShellThickness]) {
    cube([breadboardFenceThickness, mainWidth - mainShellThickness*2, breadboardFenceHeight]);
  }
 
};
  
